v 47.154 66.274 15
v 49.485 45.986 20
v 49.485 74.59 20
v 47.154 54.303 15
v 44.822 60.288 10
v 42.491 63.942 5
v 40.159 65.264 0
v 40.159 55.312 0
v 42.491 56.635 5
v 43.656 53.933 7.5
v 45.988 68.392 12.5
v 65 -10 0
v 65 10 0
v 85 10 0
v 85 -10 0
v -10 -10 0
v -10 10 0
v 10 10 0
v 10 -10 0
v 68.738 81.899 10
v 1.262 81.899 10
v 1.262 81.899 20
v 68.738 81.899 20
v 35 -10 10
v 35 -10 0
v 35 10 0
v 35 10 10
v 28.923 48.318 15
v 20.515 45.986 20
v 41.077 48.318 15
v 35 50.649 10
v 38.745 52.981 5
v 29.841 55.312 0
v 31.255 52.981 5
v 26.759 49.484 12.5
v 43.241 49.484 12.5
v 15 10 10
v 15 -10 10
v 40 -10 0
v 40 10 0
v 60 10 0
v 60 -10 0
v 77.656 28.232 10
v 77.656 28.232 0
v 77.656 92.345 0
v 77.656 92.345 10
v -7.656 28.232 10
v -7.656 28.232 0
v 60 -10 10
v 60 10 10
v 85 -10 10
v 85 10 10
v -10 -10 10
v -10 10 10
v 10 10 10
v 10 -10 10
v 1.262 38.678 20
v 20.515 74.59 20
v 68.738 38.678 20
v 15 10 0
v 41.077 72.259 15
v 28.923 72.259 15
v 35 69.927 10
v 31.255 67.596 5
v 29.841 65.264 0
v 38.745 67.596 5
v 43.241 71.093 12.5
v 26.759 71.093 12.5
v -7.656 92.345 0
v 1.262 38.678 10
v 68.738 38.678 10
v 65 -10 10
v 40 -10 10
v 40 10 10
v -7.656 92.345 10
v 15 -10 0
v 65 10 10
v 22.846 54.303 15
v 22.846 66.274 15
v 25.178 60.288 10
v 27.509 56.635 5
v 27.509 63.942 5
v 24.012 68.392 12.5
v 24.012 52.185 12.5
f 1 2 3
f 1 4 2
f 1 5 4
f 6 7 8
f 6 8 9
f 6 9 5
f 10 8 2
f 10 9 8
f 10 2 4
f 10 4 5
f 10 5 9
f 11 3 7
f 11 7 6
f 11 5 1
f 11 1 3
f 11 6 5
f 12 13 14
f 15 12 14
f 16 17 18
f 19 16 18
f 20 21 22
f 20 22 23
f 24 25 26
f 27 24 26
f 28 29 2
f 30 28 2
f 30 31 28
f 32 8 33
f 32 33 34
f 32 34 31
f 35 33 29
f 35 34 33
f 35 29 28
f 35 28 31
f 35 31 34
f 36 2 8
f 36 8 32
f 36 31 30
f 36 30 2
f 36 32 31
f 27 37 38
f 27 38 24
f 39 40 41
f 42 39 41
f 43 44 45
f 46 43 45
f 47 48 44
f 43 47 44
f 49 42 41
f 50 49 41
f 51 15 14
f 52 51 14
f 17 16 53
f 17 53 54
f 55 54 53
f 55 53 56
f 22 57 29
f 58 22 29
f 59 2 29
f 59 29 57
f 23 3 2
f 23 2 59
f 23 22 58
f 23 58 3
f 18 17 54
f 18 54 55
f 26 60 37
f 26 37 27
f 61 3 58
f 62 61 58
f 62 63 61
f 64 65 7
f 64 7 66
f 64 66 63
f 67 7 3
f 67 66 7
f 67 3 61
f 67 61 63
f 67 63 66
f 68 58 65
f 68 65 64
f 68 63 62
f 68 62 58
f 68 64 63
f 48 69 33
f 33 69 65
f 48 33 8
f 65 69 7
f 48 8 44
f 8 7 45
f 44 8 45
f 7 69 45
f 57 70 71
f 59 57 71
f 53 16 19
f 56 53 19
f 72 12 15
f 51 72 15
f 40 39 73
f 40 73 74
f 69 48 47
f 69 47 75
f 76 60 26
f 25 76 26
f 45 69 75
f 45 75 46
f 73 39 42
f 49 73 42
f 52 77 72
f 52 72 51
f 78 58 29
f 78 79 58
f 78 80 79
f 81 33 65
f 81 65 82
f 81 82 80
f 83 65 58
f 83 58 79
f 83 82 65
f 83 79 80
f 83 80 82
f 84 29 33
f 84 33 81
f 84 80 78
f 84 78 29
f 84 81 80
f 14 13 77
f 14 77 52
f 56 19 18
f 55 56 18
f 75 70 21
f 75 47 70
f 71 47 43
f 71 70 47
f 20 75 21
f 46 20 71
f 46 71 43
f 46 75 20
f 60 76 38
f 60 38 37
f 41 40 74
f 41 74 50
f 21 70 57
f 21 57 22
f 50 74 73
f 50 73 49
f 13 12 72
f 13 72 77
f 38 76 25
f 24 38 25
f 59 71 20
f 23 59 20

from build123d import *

# Parameters (mm, degrees)
SKETCH1_W             = 20
SKETCH1_H             = 20
BOSS_EXTRUDE1_DEPTH   = 10
BOSS_EXTRUDE1_2_DEPTH = 10
BOSS_EXTRUDE1_3_DEPTH = 10
BOSS_EXTRUDE1_4_DEPTH = 10
SKETCH1_W_2           = 85.312438272
SKETCH1_H_2           = 64.113648737
BOSS_EXTRUDE1_5_DEPTH = 10
SKETCH4_W             = 67.476401288
SKETCH4_H             = 43.220291255
BOSS_EXTRUDE2_DEPTH   = 10
SKETCH5_W             = 28.970393718
SKETCH5_H             = 28.604205767
CUT_EXTRUDE1_DEPTH    = 20
CUT_EXTRUDE1_TAPER    = 25


with BuildPart() as part:
    # Sketch1 → Boss-Extrude1 (new body)
    with BuildSketch(Plane.XY):
        with Locations((25, 0)):
            Rectangle(SKETCH1_W, SKETCH1_H)
    extrude(amount=BOSS_EXTRUDE1_DEPTH)


with BuildPart() as body_2:
    # Sketch1 → Boss-Extrude1 2 (new body)
    with BuildSketch(Plane.XY):
        Rectangle(SKETCH1_W, SKETCH1_H)
    extrude(amount=BOSS_EXTRUDE1_2_DEPTH)


with BuildPart() as body_3:
    # Sketch1 → Boss-Extrude1 3 (new body)
    with BuildSketch(Plane.XY):
        with Locations((50, 0)):
            Rectangle(SKETCH1_W, SKETCH1_H)
    extrude(amount=BOSS_EXTRUDE1_3_DEPTH)


with BuildPart() as body_4:
    # Sketch1 → Boss-Extrude1 4 (new body)
    with BuildSketch(Plane.XY):
        with Locations((75, 0)):
            Rectangle(SKETCH1_W, SKETCH1_H)
    extrude(amount=BOSS_EXTRUDE1_4_DEPTH)


with BuildPart() as body_5:
    # Sketch1 → Boss-Extrude1 5 (new body)
    with BuildSketch(Plane.XY):
        with Locations((35, 60.288380117)):
            Rectangle(SKETCH1_W_2, SKETCH1_H_2)
    extrude(amount=BOSS_EXTRUDE1_5_DEPTH)

    # Sketch4 → Boss-Extrude2 (add)
    with BuildSketch(Plane.XY.offset(10)):
        with Locations((35, 60.288380117)):
            Rectangle(SKETCH4_W, SKETCH4_H)
    extrude(amount=BOSS_EXTRUDE2_DEPTH)

    # Sketch5 → Cut-Extrude1 (cut)
    with BuildSketch(Plane.XY.offset(20)):
        with Locations((35, 60.288380118)):
            Rectangle(SKETCH5_W, SKETCH5_H)
    extrude(amount=-CUT_EXTRUDE1_DEPTH, taper=CUT_EXTRUDE1_TAPER, mode=Mode.SUBTRACT)


solid = Compound([part.part, body_2.part, body_3.part, body_4.part, body_5.part])
